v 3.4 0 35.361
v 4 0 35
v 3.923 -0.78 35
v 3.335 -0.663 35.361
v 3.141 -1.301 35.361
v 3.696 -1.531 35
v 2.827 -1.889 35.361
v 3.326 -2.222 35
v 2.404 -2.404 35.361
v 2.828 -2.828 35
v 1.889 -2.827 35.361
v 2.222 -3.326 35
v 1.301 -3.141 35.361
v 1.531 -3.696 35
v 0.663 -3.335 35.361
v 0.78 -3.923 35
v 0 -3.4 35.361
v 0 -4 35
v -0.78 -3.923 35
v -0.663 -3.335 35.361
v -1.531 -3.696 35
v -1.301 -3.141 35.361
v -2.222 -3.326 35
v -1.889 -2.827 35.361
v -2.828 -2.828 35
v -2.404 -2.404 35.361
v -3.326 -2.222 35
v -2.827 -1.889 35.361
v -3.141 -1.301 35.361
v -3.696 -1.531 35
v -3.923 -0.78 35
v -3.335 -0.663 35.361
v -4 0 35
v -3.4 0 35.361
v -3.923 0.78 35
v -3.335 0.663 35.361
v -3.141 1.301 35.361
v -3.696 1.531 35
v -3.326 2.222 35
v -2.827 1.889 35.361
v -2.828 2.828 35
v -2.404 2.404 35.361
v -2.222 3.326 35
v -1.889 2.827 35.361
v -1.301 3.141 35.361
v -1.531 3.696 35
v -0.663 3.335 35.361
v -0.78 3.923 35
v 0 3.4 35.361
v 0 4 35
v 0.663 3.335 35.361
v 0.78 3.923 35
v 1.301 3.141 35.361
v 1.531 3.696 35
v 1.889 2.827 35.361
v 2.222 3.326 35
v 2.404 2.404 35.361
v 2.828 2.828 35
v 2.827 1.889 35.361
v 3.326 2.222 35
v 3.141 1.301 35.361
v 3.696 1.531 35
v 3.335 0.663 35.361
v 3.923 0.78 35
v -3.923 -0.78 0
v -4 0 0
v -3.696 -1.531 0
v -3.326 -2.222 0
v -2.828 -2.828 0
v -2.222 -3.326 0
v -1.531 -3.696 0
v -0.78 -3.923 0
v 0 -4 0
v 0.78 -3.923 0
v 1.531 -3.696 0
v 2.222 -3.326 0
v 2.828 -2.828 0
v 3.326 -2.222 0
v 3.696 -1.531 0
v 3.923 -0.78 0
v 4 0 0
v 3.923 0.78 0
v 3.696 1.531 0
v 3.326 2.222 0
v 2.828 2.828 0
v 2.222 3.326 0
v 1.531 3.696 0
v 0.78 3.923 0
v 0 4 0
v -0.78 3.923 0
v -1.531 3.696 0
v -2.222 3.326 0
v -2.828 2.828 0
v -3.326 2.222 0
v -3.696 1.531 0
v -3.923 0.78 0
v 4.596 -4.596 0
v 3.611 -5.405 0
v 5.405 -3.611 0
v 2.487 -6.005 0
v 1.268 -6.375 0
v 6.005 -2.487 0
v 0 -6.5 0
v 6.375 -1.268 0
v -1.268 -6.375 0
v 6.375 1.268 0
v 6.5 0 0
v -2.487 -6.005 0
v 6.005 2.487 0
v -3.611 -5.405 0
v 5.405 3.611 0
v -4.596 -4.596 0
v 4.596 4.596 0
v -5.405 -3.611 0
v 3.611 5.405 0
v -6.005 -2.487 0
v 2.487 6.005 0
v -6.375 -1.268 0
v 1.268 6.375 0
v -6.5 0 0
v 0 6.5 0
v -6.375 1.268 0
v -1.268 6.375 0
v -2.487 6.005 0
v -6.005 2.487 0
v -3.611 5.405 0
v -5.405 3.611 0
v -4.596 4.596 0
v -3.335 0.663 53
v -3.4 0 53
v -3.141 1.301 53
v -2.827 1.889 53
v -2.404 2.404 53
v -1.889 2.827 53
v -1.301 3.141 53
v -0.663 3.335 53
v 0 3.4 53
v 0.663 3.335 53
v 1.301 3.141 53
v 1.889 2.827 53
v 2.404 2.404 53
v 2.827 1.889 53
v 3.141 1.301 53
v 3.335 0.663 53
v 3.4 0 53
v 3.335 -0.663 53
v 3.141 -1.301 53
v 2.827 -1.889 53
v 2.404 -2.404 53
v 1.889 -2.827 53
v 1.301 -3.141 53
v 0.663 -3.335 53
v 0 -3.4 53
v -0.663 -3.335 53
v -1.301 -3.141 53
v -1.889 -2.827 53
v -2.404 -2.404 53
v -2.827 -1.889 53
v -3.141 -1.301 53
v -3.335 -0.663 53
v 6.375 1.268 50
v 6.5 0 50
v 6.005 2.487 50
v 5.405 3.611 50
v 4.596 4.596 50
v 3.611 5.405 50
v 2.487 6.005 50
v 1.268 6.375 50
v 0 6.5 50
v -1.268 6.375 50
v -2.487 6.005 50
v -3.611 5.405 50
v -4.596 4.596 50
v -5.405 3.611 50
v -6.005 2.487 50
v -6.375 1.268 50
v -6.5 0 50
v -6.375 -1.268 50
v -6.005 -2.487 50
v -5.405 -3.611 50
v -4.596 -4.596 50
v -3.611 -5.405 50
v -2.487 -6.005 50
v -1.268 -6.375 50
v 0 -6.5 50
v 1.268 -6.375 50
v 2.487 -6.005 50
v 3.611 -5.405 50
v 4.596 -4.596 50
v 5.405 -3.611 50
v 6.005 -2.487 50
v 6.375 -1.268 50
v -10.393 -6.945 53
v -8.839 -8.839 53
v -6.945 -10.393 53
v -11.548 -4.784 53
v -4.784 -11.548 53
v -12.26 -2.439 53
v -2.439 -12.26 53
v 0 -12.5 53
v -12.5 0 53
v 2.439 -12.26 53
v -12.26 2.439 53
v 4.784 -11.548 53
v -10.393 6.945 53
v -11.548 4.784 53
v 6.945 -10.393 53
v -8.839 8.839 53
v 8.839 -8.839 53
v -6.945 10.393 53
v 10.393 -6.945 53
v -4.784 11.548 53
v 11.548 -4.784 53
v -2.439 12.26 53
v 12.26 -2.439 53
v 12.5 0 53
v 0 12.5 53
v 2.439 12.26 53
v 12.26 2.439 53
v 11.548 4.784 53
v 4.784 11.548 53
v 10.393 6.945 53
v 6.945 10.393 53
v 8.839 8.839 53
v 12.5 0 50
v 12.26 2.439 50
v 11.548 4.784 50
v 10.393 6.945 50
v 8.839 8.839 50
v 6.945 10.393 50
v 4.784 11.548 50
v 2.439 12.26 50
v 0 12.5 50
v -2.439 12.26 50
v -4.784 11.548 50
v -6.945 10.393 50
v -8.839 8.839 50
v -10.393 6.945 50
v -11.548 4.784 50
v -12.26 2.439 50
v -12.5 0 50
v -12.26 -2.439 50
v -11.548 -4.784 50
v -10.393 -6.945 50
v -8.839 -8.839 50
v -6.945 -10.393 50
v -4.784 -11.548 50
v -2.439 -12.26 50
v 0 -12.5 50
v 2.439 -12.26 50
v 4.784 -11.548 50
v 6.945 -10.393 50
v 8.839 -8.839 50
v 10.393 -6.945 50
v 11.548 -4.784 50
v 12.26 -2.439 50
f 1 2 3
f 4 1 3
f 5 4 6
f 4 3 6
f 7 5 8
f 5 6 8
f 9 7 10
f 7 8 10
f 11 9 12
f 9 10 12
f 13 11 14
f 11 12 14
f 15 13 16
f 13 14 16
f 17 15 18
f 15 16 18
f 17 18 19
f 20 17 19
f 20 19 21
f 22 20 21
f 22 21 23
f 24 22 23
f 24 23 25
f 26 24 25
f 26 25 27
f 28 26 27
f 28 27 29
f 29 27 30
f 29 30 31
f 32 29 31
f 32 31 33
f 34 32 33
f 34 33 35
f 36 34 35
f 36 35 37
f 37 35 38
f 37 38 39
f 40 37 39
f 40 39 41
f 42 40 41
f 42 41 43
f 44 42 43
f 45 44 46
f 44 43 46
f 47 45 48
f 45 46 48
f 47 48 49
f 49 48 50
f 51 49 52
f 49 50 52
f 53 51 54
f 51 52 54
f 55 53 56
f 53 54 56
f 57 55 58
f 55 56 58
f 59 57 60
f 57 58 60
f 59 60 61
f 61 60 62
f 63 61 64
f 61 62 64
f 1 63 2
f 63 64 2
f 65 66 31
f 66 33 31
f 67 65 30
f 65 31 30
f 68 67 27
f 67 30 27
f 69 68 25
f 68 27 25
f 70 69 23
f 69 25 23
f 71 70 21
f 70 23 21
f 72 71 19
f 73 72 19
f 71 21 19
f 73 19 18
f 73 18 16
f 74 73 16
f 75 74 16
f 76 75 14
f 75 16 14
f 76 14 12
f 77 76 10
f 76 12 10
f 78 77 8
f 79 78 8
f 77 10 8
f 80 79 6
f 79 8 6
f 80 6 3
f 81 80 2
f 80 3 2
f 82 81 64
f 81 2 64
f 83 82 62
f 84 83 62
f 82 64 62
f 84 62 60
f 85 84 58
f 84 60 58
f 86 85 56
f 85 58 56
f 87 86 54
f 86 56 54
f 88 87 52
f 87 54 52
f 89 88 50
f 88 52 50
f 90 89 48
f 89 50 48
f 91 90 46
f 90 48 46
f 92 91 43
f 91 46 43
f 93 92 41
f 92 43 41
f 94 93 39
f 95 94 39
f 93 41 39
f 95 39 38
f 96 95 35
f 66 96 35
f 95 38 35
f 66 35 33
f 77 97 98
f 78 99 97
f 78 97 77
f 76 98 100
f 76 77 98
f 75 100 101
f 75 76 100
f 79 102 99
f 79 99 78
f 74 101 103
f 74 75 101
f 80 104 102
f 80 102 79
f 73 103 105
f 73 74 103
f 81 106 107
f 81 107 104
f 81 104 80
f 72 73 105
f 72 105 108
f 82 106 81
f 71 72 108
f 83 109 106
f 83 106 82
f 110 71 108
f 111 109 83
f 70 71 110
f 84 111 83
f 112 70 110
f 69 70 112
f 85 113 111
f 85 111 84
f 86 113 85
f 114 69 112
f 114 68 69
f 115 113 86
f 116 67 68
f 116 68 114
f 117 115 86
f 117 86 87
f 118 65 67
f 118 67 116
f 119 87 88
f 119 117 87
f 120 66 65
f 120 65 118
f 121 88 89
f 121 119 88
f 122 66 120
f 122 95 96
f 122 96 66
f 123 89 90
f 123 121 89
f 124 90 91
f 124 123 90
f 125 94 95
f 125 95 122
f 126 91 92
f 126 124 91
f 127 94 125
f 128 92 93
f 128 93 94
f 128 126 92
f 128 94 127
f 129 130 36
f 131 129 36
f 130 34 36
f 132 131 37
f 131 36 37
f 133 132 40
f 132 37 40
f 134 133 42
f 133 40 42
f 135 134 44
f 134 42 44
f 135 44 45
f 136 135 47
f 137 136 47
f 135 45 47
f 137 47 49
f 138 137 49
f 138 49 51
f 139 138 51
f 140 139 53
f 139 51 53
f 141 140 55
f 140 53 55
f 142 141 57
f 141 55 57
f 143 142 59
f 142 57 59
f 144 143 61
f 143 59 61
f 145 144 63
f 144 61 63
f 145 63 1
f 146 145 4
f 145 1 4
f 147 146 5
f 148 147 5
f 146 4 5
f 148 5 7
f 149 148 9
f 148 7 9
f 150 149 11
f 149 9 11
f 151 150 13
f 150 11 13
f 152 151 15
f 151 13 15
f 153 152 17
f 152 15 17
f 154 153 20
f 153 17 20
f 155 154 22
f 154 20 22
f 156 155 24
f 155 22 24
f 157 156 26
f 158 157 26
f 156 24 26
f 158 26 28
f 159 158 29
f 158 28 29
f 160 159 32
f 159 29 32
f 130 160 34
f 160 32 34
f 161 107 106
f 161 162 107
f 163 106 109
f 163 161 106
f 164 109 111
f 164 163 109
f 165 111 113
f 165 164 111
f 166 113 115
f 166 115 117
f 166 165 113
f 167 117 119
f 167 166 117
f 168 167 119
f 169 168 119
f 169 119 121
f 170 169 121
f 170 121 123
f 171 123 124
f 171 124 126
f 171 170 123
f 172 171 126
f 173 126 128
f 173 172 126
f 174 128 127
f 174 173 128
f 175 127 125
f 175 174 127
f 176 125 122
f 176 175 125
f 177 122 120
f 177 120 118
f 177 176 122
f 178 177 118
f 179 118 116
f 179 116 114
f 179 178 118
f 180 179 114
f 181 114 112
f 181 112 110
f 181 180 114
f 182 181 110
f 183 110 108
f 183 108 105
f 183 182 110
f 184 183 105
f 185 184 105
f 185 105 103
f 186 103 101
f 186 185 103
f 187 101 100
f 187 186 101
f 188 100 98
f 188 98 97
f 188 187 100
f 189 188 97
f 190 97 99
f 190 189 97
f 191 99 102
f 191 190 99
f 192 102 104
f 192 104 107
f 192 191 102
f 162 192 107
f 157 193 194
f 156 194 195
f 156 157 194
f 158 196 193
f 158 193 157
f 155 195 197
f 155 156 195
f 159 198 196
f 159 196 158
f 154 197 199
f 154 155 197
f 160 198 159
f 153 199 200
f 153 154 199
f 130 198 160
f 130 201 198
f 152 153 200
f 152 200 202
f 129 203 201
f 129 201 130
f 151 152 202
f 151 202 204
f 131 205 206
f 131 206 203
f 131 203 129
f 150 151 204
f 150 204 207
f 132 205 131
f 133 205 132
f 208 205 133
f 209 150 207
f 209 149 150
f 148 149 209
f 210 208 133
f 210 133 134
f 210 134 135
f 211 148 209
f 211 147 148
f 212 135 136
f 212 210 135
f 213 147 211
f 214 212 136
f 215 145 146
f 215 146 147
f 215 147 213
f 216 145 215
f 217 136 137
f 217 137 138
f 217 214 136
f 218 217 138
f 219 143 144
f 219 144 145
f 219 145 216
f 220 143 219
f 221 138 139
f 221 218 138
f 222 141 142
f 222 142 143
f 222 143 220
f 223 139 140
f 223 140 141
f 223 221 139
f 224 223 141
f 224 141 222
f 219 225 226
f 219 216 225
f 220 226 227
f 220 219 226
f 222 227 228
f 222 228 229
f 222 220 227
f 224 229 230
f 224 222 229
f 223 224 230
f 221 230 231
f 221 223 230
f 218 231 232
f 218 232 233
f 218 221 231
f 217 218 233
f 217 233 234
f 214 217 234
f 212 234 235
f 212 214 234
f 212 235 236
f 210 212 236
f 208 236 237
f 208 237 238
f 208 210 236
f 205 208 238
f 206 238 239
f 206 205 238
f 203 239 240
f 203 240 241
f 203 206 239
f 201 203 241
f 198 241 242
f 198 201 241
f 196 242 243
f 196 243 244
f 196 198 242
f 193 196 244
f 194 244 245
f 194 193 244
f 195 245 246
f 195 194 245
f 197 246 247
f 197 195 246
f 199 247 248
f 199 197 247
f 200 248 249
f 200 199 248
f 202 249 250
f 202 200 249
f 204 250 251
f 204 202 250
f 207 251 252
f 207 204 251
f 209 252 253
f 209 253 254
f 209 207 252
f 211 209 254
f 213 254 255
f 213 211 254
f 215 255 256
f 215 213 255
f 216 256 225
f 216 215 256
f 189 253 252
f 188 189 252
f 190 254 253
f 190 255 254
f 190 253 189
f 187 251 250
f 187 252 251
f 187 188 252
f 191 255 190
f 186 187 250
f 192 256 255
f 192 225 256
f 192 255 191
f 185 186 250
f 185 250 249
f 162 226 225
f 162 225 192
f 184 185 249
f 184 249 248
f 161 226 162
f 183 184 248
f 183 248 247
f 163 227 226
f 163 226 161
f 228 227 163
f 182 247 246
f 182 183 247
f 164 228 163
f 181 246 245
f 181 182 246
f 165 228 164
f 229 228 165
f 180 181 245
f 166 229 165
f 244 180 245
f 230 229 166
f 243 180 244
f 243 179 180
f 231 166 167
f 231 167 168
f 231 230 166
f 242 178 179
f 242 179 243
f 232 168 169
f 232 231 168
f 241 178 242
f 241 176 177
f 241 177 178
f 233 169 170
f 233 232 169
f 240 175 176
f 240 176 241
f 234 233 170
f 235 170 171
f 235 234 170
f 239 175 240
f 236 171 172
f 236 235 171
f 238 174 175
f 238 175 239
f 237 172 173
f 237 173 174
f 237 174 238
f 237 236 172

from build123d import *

# Parameters (mm, degrees)
F3_D     = 6.8
F3_DEPTH = 20
F3_TIP   = 2.0429261047
F5_D     = 8
F5_DEPTH = 35
F5_TIP   = 2.4034424761


with BuildPart() as f1:
    # F0 (on Front) → F1 (revolve)
    with BuildSketch(Plane.XZ):
        Polygon((0, 53), (0, 0), (6.5, 0), (6.5, 50), (12.5, 50), (12.5, 53), align=None)
    revolve(axis=Axis((0, 0, 35.806838423), (0, 0, 1)))

    # F3
    with Locations(Plane.XY.offset(53)):
        with Locations((0, 0)):
            Hole(F3_D / 2, depth=F3_DEPTH)
            with Locations((0, 0, -(F3_DEPTH + F3_TIP / 2))):  # 118° drill point
                Cone(0, F3_D / 2, F3_TIP, mode=Mode.SUBTRACT)

    # F5
    with Locations(Plane(origin=(0, 0, 0), x_dir=(1, 0, 0), z_dir=(0, 0, -1))):
        with Locations((0, 0)):
            Hole(F5_D / 2, depth=F5_DEPTH)
            with Locations((0, 0, -(F5_DEPTH + F5_TIP / 2))):  # 118° drill point
                Cone(0, F5_D / 2, F5_TIP, mode=Mode.SUBTRACT)


solid = f1.part
